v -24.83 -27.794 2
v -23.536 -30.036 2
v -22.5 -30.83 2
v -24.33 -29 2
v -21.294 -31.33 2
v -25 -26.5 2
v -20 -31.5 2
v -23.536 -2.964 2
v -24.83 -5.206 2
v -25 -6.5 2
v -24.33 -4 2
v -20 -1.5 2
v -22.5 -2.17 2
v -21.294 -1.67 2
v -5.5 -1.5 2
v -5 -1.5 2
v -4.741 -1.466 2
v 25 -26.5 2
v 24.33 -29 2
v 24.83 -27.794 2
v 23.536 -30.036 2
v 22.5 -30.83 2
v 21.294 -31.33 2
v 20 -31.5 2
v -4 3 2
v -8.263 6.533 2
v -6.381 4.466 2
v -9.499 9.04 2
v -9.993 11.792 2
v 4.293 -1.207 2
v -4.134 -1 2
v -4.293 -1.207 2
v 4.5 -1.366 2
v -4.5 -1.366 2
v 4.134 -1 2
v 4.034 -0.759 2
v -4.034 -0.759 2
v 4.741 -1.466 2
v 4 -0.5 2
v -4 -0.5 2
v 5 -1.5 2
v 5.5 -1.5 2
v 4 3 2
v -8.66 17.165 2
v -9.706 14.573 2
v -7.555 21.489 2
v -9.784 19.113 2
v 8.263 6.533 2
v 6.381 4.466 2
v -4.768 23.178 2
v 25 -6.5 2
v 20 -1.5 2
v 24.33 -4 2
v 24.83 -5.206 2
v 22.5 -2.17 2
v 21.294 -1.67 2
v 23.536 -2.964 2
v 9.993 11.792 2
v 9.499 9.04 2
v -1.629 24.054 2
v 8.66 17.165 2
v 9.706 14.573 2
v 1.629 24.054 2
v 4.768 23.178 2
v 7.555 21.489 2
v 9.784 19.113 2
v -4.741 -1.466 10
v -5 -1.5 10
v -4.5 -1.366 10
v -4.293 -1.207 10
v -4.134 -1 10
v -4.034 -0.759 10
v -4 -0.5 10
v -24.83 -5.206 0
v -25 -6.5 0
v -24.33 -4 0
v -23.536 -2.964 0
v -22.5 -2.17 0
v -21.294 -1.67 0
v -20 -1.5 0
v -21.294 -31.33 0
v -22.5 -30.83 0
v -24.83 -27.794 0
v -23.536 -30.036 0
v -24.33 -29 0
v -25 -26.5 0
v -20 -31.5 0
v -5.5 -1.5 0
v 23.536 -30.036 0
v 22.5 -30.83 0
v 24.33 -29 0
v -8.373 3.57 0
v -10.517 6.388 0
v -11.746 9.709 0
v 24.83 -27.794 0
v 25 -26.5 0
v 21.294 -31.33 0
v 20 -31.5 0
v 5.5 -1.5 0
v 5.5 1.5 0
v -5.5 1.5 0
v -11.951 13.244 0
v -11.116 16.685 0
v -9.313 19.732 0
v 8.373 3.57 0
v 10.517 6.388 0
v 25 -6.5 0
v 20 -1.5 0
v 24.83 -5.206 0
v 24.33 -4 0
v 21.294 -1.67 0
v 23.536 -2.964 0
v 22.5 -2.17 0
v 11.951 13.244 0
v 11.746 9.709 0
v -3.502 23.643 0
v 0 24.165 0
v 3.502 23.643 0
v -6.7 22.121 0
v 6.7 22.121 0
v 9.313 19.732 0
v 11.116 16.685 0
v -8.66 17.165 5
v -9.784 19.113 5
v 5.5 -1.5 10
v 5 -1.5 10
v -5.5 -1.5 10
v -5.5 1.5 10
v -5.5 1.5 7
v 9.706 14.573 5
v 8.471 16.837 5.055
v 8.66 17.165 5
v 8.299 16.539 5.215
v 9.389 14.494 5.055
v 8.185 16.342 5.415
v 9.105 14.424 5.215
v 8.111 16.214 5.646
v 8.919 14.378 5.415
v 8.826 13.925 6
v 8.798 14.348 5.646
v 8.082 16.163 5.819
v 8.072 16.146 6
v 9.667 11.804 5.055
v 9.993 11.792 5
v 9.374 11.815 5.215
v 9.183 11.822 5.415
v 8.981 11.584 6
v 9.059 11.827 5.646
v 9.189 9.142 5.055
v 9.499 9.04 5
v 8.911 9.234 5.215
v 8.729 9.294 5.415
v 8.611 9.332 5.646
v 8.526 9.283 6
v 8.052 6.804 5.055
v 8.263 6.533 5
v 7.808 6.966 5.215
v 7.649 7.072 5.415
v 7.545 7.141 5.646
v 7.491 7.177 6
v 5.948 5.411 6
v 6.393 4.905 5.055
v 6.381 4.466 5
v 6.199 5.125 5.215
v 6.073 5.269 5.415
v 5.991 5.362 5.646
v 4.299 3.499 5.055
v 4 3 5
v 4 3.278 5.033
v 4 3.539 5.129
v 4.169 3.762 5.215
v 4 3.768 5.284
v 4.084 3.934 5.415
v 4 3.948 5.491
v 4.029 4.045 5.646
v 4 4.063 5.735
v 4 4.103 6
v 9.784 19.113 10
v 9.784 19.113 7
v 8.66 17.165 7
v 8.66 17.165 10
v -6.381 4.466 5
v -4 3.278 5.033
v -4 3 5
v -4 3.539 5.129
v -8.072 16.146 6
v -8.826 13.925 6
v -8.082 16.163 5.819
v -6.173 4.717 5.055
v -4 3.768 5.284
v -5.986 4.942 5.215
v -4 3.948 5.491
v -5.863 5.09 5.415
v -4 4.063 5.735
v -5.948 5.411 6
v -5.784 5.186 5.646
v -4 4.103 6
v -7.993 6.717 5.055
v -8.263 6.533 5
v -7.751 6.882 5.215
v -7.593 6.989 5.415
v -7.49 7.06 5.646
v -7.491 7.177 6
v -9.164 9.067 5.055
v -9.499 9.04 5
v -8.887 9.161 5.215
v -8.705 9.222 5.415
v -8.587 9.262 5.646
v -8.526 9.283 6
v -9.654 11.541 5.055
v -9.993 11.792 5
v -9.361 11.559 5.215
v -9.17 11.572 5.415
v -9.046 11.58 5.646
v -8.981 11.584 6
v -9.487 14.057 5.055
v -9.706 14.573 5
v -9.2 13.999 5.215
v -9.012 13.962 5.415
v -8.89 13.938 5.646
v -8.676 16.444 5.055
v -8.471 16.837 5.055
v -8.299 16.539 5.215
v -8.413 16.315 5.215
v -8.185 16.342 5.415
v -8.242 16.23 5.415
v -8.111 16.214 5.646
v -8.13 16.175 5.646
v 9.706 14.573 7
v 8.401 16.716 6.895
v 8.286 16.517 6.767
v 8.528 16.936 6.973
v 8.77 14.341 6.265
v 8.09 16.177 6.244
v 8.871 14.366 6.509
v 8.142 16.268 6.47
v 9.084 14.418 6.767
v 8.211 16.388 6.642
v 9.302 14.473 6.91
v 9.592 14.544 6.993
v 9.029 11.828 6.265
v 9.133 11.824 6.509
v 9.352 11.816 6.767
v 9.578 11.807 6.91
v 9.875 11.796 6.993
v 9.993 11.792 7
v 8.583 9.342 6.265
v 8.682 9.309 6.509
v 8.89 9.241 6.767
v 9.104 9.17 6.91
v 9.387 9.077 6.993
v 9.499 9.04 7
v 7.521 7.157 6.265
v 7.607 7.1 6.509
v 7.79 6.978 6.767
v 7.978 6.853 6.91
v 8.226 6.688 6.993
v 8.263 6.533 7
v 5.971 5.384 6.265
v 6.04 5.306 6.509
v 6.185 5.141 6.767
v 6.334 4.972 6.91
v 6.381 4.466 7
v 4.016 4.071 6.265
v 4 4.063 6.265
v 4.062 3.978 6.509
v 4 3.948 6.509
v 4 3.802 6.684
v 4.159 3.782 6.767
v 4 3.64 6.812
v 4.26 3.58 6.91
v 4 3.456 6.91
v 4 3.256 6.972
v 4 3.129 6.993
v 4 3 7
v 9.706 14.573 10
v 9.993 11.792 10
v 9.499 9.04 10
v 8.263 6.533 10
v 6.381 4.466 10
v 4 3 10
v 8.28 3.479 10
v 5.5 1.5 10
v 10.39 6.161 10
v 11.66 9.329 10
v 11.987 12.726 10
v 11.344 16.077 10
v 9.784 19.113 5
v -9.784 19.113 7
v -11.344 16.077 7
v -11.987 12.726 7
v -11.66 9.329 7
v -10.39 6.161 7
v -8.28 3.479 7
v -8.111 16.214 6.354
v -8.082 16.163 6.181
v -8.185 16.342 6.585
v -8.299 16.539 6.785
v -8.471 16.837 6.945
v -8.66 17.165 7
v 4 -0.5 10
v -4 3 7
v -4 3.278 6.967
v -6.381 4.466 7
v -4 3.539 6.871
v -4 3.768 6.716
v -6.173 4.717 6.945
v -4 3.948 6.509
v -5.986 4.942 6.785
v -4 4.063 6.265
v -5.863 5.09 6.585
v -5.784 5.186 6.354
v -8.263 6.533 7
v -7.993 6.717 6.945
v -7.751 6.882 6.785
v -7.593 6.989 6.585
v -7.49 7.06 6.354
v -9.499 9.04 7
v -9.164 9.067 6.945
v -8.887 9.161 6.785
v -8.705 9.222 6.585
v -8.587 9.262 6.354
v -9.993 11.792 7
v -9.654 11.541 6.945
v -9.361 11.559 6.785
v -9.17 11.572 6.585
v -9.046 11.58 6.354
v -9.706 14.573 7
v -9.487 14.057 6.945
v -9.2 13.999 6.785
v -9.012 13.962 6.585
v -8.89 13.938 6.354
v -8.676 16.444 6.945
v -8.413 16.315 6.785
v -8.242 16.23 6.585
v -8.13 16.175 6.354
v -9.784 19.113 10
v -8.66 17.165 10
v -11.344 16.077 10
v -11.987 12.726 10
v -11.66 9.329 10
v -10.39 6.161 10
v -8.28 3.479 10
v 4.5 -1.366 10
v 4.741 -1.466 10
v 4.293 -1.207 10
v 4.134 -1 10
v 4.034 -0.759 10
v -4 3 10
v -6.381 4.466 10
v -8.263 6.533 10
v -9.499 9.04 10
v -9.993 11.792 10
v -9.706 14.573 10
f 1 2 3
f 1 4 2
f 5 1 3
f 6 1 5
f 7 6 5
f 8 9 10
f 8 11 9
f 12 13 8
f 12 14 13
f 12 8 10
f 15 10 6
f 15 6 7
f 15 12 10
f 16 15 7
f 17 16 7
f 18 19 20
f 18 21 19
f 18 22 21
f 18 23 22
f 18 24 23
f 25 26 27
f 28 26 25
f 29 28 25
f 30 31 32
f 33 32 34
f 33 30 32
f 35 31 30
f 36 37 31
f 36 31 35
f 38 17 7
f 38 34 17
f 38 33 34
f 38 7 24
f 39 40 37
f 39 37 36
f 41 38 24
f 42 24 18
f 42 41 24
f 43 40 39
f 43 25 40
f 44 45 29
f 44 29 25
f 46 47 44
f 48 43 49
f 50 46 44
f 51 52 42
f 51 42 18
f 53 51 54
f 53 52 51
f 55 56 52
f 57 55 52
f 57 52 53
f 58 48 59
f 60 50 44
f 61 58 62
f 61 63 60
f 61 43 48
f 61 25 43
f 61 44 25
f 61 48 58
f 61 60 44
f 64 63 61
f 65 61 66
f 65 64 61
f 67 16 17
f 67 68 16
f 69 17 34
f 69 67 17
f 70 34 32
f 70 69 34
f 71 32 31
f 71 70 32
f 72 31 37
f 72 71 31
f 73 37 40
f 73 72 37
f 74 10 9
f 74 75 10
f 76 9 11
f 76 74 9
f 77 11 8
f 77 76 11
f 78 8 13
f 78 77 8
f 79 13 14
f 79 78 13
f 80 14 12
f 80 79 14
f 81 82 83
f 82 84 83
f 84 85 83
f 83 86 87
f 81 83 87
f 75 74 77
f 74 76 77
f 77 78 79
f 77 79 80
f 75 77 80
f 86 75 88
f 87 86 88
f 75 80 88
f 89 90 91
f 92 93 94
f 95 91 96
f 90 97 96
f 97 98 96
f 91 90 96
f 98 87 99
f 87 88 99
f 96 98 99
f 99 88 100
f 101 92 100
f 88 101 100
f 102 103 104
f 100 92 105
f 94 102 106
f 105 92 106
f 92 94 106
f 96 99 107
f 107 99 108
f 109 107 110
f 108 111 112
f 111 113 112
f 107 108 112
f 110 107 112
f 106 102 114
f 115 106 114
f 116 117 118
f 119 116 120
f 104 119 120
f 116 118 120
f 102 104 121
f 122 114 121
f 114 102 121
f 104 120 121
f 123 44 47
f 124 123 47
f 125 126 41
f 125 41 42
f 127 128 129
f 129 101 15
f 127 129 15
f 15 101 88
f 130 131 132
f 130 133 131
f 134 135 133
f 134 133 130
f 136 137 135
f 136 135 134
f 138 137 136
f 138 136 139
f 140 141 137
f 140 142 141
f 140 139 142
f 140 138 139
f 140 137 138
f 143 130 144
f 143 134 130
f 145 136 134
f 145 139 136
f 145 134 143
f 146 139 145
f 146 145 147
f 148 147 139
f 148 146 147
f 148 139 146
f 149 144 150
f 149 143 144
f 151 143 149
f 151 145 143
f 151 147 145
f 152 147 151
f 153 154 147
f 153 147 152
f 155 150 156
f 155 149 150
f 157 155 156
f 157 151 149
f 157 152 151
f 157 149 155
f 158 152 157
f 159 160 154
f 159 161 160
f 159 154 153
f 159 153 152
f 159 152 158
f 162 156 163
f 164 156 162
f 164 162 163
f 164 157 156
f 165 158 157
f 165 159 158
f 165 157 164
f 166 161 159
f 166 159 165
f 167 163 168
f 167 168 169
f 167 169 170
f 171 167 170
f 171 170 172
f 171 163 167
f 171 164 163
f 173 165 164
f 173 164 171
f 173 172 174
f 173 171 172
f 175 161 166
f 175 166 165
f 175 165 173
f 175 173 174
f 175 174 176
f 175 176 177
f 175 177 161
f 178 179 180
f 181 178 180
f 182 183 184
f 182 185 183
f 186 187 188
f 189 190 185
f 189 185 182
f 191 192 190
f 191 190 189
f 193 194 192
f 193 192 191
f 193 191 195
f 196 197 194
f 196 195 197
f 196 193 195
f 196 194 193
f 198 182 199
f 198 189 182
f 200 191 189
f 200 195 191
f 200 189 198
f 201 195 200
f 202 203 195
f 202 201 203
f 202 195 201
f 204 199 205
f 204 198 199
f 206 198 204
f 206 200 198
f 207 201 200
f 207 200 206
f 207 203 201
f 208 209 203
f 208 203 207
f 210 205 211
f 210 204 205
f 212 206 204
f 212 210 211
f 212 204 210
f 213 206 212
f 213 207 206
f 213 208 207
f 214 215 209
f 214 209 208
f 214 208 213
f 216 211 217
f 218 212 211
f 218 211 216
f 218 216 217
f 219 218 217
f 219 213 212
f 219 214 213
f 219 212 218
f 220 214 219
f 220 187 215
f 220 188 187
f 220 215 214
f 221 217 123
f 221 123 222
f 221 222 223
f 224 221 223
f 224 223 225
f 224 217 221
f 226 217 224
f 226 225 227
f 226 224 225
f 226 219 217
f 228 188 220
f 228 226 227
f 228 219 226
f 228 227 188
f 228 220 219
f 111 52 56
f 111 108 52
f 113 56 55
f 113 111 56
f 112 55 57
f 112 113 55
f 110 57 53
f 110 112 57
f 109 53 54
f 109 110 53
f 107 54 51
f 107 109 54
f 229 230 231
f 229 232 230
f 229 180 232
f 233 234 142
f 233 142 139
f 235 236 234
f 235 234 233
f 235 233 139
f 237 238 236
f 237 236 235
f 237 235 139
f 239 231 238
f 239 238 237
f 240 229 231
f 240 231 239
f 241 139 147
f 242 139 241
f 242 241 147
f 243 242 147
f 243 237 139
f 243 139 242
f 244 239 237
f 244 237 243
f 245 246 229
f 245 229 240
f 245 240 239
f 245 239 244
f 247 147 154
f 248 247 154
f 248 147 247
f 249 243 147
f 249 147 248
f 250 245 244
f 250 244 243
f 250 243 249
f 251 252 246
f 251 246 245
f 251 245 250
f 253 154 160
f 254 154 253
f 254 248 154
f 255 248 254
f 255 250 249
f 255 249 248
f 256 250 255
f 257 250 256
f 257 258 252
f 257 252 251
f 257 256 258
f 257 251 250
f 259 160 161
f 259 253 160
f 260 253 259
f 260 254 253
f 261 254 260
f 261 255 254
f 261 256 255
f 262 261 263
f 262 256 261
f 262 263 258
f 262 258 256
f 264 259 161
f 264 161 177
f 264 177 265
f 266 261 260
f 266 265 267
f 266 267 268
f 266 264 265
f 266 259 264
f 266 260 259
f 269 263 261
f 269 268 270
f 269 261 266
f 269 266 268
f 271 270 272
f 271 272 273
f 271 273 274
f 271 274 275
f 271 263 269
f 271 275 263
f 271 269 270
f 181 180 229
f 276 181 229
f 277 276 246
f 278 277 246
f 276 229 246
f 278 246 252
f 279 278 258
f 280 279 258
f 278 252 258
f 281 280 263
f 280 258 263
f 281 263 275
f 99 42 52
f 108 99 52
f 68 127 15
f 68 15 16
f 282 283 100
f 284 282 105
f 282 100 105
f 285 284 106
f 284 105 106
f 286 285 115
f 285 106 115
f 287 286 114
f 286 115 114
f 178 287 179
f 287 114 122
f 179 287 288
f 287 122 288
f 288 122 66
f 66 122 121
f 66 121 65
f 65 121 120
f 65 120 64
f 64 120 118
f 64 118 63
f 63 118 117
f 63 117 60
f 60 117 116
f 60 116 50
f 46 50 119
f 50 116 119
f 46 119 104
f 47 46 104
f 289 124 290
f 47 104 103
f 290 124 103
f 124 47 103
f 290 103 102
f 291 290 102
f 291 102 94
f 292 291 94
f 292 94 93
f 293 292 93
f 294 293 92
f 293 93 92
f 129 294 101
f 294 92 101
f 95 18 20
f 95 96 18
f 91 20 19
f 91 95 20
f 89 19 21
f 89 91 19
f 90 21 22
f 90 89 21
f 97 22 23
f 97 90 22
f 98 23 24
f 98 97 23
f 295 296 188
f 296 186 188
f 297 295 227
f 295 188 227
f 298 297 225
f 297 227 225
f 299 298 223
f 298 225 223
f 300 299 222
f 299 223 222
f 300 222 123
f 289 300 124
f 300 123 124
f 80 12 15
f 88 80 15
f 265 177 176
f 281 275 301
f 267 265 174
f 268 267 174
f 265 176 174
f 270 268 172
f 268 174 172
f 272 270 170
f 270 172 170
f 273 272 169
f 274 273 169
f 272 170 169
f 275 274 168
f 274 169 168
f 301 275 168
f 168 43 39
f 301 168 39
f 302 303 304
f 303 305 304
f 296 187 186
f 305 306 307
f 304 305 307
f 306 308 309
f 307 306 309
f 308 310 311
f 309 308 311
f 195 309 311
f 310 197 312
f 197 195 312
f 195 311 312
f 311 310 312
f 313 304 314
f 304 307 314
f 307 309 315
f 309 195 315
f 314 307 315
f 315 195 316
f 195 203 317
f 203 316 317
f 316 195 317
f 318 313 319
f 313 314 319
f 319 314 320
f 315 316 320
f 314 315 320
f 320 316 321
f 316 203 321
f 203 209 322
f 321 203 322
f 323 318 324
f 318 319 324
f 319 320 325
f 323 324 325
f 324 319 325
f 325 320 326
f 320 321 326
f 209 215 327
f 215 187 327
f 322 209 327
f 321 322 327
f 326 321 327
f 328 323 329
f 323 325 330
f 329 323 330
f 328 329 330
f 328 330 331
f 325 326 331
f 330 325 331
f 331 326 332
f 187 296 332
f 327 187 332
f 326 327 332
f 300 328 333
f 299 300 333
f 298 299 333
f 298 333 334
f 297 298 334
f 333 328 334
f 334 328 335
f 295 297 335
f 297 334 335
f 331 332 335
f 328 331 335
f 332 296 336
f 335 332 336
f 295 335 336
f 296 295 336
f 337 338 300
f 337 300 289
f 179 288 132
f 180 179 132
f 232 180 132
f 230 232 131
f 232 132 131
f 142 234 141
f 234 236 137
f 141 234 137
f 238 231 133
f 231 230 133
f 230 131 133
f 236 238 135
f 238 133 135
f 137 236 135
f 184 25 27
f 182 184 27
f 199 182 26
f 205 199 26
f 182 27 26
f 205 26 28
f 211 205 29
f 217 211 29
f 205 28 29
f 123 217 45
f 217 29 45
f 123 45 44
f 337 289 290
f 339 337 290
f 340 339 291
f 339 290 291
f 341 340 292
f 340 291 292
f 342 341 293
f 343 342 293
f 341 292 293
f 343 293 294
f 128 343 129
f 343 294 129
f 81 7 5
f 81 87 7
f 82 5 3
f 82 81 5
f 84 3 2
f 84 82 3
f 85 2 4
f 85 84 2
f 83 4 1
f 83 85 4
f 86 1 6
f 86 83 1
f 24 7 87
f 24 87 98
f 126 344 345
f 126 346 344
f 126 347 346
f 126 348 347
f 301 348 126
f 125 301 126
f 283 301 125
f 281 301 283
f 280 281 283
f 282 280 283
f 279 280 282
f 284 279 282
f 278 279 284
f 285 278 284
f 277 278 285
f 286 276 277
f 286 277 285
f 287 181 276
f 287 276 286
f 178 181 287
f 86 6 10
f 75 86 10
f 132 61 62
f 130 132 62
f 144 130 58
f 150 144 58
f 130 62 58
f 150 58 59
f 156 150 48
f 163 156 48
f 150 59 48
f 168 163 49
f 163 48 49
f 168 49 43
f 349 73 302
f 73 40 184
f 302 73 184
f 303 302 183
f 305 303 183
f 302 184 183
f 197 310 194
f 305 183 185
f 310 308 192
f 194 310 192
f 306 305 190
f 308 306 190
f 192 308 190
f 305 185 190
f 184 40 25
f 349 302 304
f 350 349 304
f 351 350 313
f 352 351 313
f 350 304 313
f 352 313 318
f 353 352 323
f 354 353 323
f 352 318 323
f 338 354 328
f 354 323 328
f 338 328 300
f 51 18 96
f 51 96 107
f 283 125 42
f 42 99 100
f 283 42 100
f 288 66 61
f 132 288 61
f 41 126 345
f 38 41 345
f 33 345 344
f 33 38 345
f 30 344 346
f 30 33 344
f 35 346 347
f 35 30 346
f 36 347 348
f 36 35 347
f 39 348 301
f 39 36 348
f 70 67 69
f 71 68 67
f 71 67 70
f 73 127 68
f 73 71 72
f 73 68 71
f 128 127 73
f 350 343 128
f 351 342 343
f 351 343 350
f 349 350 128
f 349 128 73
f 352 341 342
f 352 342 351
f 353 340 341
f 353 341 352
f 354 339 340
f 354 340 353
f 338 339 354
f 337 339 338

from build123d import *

# Parameters (mm, degrees)
F1_DEPTH  = 2
F3_DEPTH  = 3
F5_DEPTH  = 2
F7_DEPTH  = 3
F8_R      = 0.99999
F9_W      = 20
F9_H      = 14.6653645039
F10_DEPTH = 8
F11_W     = 50
F11_H     = 30
F12_DEPTH = 2
F13_R     = 1
F14_R     = 5


# Not quite as in the source:
# - a fillet or chamfer is up to 0.001 mm smaller than in the source, because OpenCascade refuses the exact size


with BuildPart() as f1:
    # F0 (on Top) → F1 (new body)
    with BuildSketch(Plane.XY):
        with BuildLine():
            ThreePointArc((5.5, 1.5), (0, 24.1653645039), (-5.5, 1.5))
            Line((-5.5, 1.5), (-5.5, -1.5))
            ThreePointArc((-5.5, -1.5), (0, -24.1653645039), (5.5, -1.5))
            Line((5.5, -1.5), (5.5, 1.5))
        make_face()
    extrude(amount=F1_DEPTH)

    # F2 (on face) → F3 (join)
    with BuildSketch(Plane.XY.offset(2)):
        with BuildLine():
            Line((9.7844830762, 19.1125863177), (8.6602540378, 17.1653645039))
            ThreePointArc((8.6602540378, 17.1653645039), (9.4991255677, 9.0402063559), (4, 3.0002131139))
            Line((4, 3.0002131139), (4, -6.2432010007))
            Line((4, -6.2432010007), (9.1651513899, -16.1653645039))
            ThreePointArc((9.1651513899, -16.1653645039), (9.5868378212, -9.3206253964), (5.5, -3.8137179596))
            Line((5.5, -3.8137179596), (5.5, 1.5))
            ThreePointArc((5.5, 1.5), (11.6599594736, 9.3289327537), (9.7844830762, 19.1125863177))
        make_face()
        with BuildLine():
            ThreePointArc((-4, 3.0002131139), (-9.4991255677, 9.0402063559), (-8.6602540378, 17.1653645039))
            Line((-8.6602540378, 17.1653645039), (-9.7844830762, 19.1125863177))
            ThreePointArc((-9.7844830762, 19.1125863177), (-11.6599594736, 9.3289327537), (-5.5, 1.5))
            Line((-5.5, 1.5), (-5.5, -3.8137179596))
            ThreePointArc((-5.5, -3.8137179596), (-9.5868378212, -9.3206253964), (-9.1651513899, -16.1653645039))
            Line((-9.1651513899, -16.1653645039), (-4, -6.2432010007))
            Line((-4, -6.2432010007), (-4, 3.0002131139))
        make_face()
    extrude(amount=F3_DEPTH)

    # F4 (on face) → F5 (join)
    with BuildSketch(Plane.XY.offset(5)):
        with BuildLine():
            Line((-8.0717844057, 16.1461052023), (-9.7844830762, 19.1125863177))
            ThreePointArc((-9.7844830762, 19.1125863177), (-11.6599594736, 9.3289327537), (-5.5, 1.5))
            Line((-5.5, 1.5), (-5.5, -5.0414610795))
            ThreePointArc((-5.5, -5.0414610795), (-8.6043935433, -9.5263473097), (-8.5483759414, -14.980549891))
            Line((-8.5483759414, -14.980549891), (-4, -6.2432010007))
            Line((-4, -6.2432010007), (-4, 4.1031067556))
            ThreePointArc((-4, 4.1031067556), (-8.5258693153, 9.2827350759), (-8.0717844057, 16.1461052023))
        make_face()
        with BuildLine():
            ThreePointArc((5.5, 1.5), (11.6599594736, 9.3289327537), (9.7844830762, 19.1125863177))
            Line((9.7844830762, 19.1125863177), (8.0717844057, 16.1461052023))
            ThreePointArc((8.0717844057, 16.1461052023), (8.5258693153, 9.2827350759), (4, 4.1031067556))
            Line((4, 4.1031067556), (4, -6.2432010007))
            Line((4, -6.2432010007), (8.5483759414, -14.980549891))
            ThreePointArc((8.5483759414, -14.980549891), (8.6043935433, -9.5263473097), (5.5, -5.0414610795))
            Line((5.5, -5.0414610795), (5.5, 1.5))
        make_face()
    extrude(amount=F5_DEPTH)

    # F6 (on face) → F7 (join)
    with BuildSketch(Plane.XY.offset(7)):
        with BuildLine():
            Line((9.7844830762, 19.1125863177), (8.6602540378, 17.1653645039))
            ThreePointArc((8.6602540378, 17.1653645039), (9.4991255677, 9.0402063559), (4, 3.0002131139))
            Line((4, 3.0002131139), (4, -6.2432010007))
            Line((4, -6.2432010007), (9.1651513899, -16.1653645039))
            ThreePointArc((9.1651513899, -16.1653645039), (9.5868378212, -9.3206253964), (5.5, -3.8137179596))
            Line((5.5, -3.8137179596), (5.5, 1.5))
            ThreePointArc((5.5, 1.5), (11.6599594736, 9.3289327537), (9.7844830762, 19.1125863177))
        make_face()
        with BuildLine():
            ThreePointArc((-4, 3.0002131139), (-9.4991255677, 9.0402063559), (-8.6602540378, 17.1653645039))
            Line((-8.6602540378, 17.1653645039), (-9.7844830762, 19.1125863177))
            ThreePointArc((-9.7844830762, 19.1125863177), (-11.6599594736, 9.3289327537), (-5.5, 1.5))
            Line((-5.5, 1.5), (-5.5, -3.8137179596))
            ThreePointArc((-5.5, -3.8137179596), (-9.5868378212, -9.3206253964), (-9.1651513899, -16.1653645039))
            Line((-9.1651513899, -16.1653645039), (-4, -6.2432010007))
            Line((-4, -6.2432010007), (-4, 3.0002131139))
        make_face()
    extrude(amount=F7_DEPTH)

    # F8 (radius 1 in the source; OpenCascade refuses exactly that, so slightly less here)
    f8_edges = [f1.edges().sort_by_distance(p)[0] for p in [
        (8.525869, 9.282735, 7),
        (-8.525869, 9.282735, 7),
        (-8.525869, 9.282735, 5),
        (8.525869, 9.282735, 5),
        (-8.604394, -9.526347, 5),
        (-8.604394, -9.526347, 7),
        (8.604394, -9.526347, 7),
        (8.604394, -9.526347, 5),
    ]]
    fillet(f8_edges, radius=F8_R)

    # F9 (on face) → F10 (cut)
    with BuildSketch(Plane.XY.offset(10)):
        with Locations((0, -8.8326822519)):
            Rectangle(F9_W, F9_H)
    extrude(amount=-F10_DEPTH, mode=Mode.SUBTRACT)

    # F11 (on face) → F12 (join)
    with BuildSketch(Plane.XY.offset(2)):
        with Locations((0, -16.5)):
            Rectangle(F11_W, F11_H)
    extrude(amount=-F12_DEPTH)

    # F13
    f13_edges = [f1.edges().sort_by_distance(p)[0] for p in [
        (-4, -1.5, 6),
        (4, -1.5, 6),
    ]]
    fillet(f13_edges, radius=F13_R)

    # F14
    f14_edges = [f1.edges().sort_by_distance(p)[0] for p in [
        (-25, -1.5, 1),
        (-25, -31.5, 1),
        (25, -31.5, 1),
        (25, -1.5, 1),
    ]]
    fillet(f14_edges, radius=F14_R)


solid = f1.part
